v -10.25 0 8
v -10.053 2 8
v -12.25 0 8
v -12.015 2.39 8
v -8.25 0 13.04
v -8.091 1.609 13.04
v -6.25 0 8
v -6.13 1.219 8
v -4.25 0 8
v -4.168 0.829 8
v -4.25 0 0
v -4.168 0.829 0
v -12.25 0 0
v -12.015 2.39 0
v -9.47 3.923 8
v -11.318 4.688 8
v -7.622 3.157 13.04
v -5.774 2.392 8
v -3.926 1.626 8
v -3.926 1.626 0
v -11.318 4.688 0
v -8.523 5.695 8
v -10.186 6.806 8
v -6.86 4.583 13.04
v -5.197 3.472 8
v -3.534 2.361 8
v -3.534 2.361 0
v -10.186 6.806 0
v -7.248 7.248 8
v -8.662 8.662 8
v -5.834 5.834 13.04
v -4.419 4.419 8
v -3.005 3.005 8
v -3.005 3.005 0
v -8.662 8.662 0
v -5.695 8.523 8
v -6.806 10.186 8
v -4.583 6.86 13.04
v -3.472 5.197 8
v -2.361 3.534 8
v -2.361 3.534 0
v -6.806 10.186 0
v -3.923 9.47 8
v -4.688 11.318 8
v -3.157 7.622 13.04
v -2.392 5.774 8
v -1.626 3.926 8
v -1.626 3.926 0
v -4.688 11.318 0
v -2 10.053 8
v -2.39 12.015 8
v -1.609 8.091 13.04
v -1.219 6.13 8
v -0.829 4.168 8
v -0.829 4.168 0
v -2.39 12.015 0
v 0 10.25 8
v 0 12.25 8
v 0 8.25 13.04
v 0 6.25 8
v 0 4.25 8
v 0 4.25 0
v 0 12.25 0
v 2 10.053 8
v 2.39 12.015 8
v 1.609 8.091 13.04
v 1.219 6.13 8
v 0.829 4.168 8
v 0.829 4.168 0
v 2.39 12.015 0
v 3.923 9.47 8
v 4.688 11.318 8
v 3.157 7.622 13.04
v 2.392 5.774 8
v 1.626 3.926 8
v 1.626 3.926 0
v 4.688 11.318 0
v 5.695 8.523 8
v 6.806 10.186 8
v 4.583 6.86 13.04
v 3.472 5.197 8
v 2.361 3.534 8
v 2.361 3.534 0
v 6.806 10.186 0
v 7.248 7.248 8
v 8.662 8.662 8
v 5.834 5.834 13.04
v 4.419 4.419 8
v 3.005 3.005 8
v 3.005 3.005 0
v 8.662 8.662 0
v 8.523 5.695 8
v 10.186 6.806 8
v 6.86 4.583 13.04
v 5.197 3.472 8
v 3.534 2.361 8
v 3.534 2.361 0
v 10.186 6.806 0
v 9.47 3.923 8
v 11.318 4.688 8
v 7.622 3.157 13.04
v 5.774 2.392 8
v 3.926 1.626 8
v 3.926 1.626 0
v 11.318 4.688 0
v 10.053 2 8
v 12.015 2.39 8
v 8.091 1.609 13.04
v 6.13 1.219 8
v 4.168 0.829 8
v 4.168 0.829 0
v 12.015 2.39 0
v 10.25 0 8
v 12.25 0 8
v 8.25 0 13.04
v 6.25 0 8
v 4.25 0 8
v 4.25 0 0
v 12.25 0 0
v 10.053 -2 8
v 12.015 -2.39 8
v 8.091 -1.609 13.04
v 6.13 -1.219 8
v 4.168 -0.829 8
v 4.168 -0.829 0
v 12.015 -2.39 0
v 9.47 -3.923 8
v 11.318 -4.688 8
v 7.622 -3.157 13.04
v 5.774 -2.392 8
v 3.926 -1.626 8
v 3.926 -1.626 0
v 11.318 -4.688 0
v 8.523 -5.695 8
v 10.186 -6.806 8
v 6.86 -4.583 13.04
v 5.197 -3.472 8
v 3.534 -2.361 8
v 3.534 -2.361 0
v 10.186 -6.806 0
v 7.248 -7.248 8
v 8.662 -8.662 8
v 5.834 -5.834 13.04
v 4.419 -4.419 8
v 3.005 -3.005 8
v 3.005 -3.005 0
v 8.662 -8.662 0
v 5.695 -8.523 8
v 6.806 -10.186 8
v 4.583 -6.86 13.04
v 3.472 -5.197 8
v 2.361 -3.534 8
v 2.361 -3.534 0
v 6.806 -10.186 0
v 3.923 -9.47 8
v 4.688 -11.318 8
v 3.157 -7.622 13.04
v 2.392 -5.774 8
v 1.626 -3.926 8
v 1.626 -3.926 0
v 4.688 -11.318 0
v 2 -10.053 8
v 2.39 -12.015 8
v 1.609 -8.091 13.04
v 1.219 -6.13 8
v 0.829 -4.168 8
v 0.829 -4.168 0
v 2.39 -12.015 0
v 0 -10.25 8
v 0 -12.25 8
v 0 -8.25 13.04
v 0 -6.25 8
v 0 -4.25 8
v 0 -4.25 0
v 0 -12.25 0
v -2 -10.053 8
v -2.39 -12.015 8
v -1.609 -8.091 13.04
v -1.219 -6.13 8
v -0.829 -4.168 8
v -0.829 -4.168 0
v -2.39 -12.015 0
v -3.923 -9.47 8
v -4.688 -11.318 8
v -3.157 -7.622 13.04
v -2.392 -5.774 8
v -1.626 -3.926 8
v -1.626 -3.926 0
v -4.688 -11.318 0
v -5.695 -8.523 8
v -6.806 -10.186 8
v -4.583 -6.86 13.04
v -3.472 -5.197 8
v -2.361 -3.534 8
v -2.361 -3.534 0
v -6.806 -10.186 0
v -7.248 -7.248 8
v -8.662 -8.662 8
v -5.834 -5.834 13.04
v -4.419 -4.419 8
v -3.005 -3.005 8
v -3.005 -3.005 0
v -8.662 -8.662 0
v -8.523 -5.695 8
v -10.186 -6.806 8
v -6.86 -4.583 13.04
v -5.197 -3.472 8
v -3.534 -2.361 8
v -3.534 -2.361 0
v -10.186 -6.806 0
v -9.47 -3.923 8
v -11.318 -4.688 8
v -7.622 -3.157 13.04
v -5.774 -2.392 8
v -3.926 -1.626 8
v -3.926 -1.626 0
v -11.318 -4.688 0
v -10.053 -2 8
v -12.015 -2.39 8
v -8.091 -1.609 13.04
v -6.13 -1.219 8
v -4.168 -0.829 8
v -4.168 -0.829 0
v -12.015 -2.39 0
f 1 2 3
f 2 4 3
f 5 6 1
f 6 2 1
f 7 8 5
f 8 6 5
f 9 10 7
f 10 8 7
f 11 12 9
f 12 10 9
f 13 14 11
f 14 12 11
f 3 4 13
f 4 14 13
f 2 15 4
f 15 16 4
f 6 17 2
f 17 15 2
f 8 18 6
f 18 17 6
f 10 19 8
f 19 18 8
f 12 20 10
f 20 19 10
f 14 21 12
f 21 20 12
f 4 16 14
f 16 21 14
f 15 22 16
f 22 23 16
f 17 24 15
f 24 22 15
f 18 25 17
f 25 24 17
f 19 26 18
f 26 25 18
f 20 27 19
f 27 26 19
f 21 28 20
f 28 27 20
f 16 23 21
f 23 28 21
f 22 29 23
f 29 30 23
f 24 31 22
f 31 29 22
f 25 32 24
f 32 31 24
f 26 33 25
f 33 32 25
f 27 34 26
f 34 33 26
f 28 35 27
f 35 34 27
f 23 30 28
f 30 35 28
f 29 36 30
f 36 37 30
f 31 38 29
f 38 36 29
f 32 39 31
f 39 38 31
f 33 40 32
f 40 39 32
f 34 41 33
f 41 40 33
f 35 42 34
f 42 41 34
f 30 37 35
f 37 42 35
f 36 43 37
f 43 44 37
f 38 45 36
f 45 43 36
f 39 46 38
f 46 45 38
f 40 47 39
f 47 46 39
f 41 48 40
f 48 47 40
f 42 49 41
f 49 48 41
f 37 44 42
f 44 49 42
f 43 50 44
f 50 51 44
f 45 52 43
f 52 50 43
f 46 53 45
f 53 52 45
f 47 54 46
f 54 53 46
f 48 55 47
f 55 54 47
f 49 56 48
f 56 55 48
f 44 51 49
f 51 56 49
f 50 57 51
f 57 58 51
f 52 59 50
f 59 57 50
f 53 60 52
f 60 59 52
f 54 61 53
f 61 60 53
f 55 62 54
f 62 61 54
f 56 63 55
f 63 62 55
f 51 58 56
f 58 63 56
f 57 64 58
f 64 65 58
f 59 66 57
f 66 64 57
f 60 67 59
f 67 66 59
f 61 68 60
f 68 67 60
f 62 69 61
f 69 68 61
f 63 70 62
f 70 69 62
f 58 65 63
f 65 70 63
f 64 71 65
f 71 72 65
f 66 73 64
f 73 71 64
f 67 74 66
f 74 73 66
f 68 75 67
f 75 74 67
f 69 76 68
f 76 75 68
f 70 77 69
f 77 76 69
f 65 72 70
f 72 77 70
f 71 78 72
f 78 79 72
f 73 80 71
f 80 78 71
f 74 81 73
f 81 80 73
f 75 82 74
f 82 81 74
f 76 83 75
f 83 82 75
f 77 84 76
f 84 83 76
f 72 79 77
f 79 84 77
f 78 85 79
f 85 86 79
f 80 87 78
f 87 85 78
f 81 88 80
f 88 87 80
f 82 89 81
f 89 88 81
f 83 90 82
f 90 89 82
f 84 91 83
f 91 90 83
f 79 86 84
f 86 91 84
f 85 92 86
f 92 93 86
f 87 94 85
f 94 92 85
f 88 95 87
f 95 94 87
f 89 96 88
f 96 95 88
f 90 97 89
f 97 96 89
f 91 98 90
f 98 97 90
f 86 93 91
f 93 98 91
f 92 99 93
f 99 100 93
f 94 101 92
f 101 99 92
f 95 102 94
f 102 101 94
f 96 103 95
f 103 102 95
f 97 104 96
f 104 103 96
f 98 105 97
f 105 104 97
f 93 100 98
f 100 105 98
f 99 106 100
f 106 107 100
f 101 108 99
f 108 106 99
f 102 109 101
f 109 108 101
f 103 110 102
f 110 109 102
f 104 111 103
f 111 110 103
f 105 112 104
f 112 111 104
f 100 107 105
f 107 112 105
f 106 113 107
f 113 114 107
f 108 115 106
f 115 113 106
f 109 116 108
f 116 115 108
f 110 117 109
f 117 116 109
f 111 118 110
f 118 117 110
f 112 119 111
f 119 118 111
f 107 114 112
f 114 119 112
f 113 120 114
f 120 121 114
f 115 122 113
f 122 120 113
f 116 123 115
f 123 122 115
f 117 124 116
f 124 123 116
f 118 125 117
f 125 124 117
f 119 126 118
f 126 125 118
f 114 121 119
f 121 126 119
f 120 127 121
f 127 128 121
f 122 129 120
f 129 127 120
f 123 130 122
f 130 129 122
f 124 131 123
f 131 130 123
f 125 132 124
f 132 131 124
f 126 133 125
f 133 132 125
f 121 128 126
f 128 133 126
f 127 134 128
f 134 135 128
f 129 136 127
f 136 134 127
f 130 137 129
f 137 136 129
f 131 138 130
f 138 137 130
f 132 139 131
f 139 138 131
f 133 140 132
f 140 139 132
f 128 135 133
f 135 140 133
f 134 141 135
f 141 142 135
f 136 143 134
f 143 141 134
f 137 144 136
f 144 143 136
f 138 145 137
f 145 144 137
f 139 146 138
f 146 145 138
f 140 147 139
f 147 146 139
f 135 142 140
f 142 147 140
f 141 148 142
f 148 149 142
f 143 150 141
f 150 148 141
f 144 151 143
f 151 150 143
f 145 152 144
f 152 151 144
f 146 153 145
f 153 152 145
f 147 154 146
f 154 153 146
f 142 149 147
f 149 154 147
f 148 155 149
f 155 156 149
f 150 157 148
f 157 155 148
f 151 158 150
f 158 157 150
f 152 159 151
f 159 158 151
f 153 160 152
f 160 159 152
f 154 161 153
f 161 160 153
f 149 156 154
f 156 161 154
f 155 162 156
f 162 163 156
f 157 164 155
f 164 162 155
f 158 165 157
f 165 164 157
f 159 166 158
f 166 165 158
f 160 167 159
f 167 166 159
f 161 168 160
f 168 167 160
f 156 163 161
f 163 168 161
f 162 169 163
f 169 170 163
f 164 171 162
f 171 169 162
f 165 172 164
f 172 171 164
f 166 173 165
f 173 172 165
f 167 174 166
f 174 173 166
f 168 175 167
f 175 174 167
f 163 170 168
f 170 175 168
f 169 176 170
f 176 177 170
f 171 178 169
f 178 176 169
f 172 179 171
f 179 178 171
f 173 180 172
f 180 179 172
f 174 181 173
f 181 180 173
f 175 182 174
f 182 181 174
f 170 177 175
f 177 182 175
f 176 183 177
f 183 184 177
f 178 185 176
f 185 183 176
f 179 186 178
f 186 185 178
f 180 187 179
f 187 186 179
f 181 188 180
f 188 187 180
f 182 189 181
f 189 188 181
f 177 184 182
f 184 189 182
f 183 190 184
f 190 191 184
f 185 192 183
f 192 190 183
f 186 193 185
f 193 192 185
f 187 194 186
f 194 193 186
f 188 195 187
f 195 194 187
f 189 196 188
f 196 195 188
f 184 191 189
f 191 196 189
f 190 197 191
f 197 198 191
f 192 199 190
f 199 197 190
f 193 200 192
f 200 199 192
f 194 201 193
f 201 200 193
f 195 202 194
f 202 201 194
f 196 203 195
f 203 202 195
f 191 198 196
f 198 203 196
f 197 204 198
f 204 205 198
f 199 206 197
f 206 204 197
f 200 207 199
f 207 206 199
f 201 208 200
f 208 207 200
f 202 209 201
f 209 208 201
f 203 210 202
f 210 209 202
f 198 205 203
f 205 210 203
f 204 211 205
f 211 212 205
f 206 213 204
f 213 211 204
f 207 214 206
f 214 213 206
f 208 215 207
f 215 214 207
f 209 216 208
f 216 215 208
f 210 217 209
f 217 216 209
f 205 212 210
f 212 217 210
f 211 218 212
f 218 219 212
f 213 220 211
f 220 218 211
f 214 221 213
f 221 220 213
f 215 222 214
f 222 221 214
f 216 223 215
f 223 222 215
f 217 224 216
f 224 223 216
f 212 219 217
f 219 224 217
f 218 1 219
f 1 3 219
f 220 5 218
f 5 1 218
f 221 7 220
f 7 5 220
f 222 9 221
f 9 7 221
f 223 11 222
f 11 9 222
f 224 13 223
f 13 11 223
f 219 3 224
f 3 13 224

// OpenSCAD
$fn = 32;

// ----------------------------------------------------------------------
// Form washer: domed washer, 24.5 mm outside, 8.5 mm bore
// ----------------------------------------------------------------------

// --- parameters (mm) ---
revolve_angle = 360;      // full turn around the Z axis
profile_points = 7;       // points of the closed outline

profile = [[4.25, 0], [12.25, 0], [12.25, 8], [10.25, 8], [8.25, 13.04], [6.25, 8], [4.25, 8]];  // single closed polygon, 7 points, counter clockwise

// --- the one profile operation ---
rotate_extrude(angle = revolve_angle) polygon(points = profile);
